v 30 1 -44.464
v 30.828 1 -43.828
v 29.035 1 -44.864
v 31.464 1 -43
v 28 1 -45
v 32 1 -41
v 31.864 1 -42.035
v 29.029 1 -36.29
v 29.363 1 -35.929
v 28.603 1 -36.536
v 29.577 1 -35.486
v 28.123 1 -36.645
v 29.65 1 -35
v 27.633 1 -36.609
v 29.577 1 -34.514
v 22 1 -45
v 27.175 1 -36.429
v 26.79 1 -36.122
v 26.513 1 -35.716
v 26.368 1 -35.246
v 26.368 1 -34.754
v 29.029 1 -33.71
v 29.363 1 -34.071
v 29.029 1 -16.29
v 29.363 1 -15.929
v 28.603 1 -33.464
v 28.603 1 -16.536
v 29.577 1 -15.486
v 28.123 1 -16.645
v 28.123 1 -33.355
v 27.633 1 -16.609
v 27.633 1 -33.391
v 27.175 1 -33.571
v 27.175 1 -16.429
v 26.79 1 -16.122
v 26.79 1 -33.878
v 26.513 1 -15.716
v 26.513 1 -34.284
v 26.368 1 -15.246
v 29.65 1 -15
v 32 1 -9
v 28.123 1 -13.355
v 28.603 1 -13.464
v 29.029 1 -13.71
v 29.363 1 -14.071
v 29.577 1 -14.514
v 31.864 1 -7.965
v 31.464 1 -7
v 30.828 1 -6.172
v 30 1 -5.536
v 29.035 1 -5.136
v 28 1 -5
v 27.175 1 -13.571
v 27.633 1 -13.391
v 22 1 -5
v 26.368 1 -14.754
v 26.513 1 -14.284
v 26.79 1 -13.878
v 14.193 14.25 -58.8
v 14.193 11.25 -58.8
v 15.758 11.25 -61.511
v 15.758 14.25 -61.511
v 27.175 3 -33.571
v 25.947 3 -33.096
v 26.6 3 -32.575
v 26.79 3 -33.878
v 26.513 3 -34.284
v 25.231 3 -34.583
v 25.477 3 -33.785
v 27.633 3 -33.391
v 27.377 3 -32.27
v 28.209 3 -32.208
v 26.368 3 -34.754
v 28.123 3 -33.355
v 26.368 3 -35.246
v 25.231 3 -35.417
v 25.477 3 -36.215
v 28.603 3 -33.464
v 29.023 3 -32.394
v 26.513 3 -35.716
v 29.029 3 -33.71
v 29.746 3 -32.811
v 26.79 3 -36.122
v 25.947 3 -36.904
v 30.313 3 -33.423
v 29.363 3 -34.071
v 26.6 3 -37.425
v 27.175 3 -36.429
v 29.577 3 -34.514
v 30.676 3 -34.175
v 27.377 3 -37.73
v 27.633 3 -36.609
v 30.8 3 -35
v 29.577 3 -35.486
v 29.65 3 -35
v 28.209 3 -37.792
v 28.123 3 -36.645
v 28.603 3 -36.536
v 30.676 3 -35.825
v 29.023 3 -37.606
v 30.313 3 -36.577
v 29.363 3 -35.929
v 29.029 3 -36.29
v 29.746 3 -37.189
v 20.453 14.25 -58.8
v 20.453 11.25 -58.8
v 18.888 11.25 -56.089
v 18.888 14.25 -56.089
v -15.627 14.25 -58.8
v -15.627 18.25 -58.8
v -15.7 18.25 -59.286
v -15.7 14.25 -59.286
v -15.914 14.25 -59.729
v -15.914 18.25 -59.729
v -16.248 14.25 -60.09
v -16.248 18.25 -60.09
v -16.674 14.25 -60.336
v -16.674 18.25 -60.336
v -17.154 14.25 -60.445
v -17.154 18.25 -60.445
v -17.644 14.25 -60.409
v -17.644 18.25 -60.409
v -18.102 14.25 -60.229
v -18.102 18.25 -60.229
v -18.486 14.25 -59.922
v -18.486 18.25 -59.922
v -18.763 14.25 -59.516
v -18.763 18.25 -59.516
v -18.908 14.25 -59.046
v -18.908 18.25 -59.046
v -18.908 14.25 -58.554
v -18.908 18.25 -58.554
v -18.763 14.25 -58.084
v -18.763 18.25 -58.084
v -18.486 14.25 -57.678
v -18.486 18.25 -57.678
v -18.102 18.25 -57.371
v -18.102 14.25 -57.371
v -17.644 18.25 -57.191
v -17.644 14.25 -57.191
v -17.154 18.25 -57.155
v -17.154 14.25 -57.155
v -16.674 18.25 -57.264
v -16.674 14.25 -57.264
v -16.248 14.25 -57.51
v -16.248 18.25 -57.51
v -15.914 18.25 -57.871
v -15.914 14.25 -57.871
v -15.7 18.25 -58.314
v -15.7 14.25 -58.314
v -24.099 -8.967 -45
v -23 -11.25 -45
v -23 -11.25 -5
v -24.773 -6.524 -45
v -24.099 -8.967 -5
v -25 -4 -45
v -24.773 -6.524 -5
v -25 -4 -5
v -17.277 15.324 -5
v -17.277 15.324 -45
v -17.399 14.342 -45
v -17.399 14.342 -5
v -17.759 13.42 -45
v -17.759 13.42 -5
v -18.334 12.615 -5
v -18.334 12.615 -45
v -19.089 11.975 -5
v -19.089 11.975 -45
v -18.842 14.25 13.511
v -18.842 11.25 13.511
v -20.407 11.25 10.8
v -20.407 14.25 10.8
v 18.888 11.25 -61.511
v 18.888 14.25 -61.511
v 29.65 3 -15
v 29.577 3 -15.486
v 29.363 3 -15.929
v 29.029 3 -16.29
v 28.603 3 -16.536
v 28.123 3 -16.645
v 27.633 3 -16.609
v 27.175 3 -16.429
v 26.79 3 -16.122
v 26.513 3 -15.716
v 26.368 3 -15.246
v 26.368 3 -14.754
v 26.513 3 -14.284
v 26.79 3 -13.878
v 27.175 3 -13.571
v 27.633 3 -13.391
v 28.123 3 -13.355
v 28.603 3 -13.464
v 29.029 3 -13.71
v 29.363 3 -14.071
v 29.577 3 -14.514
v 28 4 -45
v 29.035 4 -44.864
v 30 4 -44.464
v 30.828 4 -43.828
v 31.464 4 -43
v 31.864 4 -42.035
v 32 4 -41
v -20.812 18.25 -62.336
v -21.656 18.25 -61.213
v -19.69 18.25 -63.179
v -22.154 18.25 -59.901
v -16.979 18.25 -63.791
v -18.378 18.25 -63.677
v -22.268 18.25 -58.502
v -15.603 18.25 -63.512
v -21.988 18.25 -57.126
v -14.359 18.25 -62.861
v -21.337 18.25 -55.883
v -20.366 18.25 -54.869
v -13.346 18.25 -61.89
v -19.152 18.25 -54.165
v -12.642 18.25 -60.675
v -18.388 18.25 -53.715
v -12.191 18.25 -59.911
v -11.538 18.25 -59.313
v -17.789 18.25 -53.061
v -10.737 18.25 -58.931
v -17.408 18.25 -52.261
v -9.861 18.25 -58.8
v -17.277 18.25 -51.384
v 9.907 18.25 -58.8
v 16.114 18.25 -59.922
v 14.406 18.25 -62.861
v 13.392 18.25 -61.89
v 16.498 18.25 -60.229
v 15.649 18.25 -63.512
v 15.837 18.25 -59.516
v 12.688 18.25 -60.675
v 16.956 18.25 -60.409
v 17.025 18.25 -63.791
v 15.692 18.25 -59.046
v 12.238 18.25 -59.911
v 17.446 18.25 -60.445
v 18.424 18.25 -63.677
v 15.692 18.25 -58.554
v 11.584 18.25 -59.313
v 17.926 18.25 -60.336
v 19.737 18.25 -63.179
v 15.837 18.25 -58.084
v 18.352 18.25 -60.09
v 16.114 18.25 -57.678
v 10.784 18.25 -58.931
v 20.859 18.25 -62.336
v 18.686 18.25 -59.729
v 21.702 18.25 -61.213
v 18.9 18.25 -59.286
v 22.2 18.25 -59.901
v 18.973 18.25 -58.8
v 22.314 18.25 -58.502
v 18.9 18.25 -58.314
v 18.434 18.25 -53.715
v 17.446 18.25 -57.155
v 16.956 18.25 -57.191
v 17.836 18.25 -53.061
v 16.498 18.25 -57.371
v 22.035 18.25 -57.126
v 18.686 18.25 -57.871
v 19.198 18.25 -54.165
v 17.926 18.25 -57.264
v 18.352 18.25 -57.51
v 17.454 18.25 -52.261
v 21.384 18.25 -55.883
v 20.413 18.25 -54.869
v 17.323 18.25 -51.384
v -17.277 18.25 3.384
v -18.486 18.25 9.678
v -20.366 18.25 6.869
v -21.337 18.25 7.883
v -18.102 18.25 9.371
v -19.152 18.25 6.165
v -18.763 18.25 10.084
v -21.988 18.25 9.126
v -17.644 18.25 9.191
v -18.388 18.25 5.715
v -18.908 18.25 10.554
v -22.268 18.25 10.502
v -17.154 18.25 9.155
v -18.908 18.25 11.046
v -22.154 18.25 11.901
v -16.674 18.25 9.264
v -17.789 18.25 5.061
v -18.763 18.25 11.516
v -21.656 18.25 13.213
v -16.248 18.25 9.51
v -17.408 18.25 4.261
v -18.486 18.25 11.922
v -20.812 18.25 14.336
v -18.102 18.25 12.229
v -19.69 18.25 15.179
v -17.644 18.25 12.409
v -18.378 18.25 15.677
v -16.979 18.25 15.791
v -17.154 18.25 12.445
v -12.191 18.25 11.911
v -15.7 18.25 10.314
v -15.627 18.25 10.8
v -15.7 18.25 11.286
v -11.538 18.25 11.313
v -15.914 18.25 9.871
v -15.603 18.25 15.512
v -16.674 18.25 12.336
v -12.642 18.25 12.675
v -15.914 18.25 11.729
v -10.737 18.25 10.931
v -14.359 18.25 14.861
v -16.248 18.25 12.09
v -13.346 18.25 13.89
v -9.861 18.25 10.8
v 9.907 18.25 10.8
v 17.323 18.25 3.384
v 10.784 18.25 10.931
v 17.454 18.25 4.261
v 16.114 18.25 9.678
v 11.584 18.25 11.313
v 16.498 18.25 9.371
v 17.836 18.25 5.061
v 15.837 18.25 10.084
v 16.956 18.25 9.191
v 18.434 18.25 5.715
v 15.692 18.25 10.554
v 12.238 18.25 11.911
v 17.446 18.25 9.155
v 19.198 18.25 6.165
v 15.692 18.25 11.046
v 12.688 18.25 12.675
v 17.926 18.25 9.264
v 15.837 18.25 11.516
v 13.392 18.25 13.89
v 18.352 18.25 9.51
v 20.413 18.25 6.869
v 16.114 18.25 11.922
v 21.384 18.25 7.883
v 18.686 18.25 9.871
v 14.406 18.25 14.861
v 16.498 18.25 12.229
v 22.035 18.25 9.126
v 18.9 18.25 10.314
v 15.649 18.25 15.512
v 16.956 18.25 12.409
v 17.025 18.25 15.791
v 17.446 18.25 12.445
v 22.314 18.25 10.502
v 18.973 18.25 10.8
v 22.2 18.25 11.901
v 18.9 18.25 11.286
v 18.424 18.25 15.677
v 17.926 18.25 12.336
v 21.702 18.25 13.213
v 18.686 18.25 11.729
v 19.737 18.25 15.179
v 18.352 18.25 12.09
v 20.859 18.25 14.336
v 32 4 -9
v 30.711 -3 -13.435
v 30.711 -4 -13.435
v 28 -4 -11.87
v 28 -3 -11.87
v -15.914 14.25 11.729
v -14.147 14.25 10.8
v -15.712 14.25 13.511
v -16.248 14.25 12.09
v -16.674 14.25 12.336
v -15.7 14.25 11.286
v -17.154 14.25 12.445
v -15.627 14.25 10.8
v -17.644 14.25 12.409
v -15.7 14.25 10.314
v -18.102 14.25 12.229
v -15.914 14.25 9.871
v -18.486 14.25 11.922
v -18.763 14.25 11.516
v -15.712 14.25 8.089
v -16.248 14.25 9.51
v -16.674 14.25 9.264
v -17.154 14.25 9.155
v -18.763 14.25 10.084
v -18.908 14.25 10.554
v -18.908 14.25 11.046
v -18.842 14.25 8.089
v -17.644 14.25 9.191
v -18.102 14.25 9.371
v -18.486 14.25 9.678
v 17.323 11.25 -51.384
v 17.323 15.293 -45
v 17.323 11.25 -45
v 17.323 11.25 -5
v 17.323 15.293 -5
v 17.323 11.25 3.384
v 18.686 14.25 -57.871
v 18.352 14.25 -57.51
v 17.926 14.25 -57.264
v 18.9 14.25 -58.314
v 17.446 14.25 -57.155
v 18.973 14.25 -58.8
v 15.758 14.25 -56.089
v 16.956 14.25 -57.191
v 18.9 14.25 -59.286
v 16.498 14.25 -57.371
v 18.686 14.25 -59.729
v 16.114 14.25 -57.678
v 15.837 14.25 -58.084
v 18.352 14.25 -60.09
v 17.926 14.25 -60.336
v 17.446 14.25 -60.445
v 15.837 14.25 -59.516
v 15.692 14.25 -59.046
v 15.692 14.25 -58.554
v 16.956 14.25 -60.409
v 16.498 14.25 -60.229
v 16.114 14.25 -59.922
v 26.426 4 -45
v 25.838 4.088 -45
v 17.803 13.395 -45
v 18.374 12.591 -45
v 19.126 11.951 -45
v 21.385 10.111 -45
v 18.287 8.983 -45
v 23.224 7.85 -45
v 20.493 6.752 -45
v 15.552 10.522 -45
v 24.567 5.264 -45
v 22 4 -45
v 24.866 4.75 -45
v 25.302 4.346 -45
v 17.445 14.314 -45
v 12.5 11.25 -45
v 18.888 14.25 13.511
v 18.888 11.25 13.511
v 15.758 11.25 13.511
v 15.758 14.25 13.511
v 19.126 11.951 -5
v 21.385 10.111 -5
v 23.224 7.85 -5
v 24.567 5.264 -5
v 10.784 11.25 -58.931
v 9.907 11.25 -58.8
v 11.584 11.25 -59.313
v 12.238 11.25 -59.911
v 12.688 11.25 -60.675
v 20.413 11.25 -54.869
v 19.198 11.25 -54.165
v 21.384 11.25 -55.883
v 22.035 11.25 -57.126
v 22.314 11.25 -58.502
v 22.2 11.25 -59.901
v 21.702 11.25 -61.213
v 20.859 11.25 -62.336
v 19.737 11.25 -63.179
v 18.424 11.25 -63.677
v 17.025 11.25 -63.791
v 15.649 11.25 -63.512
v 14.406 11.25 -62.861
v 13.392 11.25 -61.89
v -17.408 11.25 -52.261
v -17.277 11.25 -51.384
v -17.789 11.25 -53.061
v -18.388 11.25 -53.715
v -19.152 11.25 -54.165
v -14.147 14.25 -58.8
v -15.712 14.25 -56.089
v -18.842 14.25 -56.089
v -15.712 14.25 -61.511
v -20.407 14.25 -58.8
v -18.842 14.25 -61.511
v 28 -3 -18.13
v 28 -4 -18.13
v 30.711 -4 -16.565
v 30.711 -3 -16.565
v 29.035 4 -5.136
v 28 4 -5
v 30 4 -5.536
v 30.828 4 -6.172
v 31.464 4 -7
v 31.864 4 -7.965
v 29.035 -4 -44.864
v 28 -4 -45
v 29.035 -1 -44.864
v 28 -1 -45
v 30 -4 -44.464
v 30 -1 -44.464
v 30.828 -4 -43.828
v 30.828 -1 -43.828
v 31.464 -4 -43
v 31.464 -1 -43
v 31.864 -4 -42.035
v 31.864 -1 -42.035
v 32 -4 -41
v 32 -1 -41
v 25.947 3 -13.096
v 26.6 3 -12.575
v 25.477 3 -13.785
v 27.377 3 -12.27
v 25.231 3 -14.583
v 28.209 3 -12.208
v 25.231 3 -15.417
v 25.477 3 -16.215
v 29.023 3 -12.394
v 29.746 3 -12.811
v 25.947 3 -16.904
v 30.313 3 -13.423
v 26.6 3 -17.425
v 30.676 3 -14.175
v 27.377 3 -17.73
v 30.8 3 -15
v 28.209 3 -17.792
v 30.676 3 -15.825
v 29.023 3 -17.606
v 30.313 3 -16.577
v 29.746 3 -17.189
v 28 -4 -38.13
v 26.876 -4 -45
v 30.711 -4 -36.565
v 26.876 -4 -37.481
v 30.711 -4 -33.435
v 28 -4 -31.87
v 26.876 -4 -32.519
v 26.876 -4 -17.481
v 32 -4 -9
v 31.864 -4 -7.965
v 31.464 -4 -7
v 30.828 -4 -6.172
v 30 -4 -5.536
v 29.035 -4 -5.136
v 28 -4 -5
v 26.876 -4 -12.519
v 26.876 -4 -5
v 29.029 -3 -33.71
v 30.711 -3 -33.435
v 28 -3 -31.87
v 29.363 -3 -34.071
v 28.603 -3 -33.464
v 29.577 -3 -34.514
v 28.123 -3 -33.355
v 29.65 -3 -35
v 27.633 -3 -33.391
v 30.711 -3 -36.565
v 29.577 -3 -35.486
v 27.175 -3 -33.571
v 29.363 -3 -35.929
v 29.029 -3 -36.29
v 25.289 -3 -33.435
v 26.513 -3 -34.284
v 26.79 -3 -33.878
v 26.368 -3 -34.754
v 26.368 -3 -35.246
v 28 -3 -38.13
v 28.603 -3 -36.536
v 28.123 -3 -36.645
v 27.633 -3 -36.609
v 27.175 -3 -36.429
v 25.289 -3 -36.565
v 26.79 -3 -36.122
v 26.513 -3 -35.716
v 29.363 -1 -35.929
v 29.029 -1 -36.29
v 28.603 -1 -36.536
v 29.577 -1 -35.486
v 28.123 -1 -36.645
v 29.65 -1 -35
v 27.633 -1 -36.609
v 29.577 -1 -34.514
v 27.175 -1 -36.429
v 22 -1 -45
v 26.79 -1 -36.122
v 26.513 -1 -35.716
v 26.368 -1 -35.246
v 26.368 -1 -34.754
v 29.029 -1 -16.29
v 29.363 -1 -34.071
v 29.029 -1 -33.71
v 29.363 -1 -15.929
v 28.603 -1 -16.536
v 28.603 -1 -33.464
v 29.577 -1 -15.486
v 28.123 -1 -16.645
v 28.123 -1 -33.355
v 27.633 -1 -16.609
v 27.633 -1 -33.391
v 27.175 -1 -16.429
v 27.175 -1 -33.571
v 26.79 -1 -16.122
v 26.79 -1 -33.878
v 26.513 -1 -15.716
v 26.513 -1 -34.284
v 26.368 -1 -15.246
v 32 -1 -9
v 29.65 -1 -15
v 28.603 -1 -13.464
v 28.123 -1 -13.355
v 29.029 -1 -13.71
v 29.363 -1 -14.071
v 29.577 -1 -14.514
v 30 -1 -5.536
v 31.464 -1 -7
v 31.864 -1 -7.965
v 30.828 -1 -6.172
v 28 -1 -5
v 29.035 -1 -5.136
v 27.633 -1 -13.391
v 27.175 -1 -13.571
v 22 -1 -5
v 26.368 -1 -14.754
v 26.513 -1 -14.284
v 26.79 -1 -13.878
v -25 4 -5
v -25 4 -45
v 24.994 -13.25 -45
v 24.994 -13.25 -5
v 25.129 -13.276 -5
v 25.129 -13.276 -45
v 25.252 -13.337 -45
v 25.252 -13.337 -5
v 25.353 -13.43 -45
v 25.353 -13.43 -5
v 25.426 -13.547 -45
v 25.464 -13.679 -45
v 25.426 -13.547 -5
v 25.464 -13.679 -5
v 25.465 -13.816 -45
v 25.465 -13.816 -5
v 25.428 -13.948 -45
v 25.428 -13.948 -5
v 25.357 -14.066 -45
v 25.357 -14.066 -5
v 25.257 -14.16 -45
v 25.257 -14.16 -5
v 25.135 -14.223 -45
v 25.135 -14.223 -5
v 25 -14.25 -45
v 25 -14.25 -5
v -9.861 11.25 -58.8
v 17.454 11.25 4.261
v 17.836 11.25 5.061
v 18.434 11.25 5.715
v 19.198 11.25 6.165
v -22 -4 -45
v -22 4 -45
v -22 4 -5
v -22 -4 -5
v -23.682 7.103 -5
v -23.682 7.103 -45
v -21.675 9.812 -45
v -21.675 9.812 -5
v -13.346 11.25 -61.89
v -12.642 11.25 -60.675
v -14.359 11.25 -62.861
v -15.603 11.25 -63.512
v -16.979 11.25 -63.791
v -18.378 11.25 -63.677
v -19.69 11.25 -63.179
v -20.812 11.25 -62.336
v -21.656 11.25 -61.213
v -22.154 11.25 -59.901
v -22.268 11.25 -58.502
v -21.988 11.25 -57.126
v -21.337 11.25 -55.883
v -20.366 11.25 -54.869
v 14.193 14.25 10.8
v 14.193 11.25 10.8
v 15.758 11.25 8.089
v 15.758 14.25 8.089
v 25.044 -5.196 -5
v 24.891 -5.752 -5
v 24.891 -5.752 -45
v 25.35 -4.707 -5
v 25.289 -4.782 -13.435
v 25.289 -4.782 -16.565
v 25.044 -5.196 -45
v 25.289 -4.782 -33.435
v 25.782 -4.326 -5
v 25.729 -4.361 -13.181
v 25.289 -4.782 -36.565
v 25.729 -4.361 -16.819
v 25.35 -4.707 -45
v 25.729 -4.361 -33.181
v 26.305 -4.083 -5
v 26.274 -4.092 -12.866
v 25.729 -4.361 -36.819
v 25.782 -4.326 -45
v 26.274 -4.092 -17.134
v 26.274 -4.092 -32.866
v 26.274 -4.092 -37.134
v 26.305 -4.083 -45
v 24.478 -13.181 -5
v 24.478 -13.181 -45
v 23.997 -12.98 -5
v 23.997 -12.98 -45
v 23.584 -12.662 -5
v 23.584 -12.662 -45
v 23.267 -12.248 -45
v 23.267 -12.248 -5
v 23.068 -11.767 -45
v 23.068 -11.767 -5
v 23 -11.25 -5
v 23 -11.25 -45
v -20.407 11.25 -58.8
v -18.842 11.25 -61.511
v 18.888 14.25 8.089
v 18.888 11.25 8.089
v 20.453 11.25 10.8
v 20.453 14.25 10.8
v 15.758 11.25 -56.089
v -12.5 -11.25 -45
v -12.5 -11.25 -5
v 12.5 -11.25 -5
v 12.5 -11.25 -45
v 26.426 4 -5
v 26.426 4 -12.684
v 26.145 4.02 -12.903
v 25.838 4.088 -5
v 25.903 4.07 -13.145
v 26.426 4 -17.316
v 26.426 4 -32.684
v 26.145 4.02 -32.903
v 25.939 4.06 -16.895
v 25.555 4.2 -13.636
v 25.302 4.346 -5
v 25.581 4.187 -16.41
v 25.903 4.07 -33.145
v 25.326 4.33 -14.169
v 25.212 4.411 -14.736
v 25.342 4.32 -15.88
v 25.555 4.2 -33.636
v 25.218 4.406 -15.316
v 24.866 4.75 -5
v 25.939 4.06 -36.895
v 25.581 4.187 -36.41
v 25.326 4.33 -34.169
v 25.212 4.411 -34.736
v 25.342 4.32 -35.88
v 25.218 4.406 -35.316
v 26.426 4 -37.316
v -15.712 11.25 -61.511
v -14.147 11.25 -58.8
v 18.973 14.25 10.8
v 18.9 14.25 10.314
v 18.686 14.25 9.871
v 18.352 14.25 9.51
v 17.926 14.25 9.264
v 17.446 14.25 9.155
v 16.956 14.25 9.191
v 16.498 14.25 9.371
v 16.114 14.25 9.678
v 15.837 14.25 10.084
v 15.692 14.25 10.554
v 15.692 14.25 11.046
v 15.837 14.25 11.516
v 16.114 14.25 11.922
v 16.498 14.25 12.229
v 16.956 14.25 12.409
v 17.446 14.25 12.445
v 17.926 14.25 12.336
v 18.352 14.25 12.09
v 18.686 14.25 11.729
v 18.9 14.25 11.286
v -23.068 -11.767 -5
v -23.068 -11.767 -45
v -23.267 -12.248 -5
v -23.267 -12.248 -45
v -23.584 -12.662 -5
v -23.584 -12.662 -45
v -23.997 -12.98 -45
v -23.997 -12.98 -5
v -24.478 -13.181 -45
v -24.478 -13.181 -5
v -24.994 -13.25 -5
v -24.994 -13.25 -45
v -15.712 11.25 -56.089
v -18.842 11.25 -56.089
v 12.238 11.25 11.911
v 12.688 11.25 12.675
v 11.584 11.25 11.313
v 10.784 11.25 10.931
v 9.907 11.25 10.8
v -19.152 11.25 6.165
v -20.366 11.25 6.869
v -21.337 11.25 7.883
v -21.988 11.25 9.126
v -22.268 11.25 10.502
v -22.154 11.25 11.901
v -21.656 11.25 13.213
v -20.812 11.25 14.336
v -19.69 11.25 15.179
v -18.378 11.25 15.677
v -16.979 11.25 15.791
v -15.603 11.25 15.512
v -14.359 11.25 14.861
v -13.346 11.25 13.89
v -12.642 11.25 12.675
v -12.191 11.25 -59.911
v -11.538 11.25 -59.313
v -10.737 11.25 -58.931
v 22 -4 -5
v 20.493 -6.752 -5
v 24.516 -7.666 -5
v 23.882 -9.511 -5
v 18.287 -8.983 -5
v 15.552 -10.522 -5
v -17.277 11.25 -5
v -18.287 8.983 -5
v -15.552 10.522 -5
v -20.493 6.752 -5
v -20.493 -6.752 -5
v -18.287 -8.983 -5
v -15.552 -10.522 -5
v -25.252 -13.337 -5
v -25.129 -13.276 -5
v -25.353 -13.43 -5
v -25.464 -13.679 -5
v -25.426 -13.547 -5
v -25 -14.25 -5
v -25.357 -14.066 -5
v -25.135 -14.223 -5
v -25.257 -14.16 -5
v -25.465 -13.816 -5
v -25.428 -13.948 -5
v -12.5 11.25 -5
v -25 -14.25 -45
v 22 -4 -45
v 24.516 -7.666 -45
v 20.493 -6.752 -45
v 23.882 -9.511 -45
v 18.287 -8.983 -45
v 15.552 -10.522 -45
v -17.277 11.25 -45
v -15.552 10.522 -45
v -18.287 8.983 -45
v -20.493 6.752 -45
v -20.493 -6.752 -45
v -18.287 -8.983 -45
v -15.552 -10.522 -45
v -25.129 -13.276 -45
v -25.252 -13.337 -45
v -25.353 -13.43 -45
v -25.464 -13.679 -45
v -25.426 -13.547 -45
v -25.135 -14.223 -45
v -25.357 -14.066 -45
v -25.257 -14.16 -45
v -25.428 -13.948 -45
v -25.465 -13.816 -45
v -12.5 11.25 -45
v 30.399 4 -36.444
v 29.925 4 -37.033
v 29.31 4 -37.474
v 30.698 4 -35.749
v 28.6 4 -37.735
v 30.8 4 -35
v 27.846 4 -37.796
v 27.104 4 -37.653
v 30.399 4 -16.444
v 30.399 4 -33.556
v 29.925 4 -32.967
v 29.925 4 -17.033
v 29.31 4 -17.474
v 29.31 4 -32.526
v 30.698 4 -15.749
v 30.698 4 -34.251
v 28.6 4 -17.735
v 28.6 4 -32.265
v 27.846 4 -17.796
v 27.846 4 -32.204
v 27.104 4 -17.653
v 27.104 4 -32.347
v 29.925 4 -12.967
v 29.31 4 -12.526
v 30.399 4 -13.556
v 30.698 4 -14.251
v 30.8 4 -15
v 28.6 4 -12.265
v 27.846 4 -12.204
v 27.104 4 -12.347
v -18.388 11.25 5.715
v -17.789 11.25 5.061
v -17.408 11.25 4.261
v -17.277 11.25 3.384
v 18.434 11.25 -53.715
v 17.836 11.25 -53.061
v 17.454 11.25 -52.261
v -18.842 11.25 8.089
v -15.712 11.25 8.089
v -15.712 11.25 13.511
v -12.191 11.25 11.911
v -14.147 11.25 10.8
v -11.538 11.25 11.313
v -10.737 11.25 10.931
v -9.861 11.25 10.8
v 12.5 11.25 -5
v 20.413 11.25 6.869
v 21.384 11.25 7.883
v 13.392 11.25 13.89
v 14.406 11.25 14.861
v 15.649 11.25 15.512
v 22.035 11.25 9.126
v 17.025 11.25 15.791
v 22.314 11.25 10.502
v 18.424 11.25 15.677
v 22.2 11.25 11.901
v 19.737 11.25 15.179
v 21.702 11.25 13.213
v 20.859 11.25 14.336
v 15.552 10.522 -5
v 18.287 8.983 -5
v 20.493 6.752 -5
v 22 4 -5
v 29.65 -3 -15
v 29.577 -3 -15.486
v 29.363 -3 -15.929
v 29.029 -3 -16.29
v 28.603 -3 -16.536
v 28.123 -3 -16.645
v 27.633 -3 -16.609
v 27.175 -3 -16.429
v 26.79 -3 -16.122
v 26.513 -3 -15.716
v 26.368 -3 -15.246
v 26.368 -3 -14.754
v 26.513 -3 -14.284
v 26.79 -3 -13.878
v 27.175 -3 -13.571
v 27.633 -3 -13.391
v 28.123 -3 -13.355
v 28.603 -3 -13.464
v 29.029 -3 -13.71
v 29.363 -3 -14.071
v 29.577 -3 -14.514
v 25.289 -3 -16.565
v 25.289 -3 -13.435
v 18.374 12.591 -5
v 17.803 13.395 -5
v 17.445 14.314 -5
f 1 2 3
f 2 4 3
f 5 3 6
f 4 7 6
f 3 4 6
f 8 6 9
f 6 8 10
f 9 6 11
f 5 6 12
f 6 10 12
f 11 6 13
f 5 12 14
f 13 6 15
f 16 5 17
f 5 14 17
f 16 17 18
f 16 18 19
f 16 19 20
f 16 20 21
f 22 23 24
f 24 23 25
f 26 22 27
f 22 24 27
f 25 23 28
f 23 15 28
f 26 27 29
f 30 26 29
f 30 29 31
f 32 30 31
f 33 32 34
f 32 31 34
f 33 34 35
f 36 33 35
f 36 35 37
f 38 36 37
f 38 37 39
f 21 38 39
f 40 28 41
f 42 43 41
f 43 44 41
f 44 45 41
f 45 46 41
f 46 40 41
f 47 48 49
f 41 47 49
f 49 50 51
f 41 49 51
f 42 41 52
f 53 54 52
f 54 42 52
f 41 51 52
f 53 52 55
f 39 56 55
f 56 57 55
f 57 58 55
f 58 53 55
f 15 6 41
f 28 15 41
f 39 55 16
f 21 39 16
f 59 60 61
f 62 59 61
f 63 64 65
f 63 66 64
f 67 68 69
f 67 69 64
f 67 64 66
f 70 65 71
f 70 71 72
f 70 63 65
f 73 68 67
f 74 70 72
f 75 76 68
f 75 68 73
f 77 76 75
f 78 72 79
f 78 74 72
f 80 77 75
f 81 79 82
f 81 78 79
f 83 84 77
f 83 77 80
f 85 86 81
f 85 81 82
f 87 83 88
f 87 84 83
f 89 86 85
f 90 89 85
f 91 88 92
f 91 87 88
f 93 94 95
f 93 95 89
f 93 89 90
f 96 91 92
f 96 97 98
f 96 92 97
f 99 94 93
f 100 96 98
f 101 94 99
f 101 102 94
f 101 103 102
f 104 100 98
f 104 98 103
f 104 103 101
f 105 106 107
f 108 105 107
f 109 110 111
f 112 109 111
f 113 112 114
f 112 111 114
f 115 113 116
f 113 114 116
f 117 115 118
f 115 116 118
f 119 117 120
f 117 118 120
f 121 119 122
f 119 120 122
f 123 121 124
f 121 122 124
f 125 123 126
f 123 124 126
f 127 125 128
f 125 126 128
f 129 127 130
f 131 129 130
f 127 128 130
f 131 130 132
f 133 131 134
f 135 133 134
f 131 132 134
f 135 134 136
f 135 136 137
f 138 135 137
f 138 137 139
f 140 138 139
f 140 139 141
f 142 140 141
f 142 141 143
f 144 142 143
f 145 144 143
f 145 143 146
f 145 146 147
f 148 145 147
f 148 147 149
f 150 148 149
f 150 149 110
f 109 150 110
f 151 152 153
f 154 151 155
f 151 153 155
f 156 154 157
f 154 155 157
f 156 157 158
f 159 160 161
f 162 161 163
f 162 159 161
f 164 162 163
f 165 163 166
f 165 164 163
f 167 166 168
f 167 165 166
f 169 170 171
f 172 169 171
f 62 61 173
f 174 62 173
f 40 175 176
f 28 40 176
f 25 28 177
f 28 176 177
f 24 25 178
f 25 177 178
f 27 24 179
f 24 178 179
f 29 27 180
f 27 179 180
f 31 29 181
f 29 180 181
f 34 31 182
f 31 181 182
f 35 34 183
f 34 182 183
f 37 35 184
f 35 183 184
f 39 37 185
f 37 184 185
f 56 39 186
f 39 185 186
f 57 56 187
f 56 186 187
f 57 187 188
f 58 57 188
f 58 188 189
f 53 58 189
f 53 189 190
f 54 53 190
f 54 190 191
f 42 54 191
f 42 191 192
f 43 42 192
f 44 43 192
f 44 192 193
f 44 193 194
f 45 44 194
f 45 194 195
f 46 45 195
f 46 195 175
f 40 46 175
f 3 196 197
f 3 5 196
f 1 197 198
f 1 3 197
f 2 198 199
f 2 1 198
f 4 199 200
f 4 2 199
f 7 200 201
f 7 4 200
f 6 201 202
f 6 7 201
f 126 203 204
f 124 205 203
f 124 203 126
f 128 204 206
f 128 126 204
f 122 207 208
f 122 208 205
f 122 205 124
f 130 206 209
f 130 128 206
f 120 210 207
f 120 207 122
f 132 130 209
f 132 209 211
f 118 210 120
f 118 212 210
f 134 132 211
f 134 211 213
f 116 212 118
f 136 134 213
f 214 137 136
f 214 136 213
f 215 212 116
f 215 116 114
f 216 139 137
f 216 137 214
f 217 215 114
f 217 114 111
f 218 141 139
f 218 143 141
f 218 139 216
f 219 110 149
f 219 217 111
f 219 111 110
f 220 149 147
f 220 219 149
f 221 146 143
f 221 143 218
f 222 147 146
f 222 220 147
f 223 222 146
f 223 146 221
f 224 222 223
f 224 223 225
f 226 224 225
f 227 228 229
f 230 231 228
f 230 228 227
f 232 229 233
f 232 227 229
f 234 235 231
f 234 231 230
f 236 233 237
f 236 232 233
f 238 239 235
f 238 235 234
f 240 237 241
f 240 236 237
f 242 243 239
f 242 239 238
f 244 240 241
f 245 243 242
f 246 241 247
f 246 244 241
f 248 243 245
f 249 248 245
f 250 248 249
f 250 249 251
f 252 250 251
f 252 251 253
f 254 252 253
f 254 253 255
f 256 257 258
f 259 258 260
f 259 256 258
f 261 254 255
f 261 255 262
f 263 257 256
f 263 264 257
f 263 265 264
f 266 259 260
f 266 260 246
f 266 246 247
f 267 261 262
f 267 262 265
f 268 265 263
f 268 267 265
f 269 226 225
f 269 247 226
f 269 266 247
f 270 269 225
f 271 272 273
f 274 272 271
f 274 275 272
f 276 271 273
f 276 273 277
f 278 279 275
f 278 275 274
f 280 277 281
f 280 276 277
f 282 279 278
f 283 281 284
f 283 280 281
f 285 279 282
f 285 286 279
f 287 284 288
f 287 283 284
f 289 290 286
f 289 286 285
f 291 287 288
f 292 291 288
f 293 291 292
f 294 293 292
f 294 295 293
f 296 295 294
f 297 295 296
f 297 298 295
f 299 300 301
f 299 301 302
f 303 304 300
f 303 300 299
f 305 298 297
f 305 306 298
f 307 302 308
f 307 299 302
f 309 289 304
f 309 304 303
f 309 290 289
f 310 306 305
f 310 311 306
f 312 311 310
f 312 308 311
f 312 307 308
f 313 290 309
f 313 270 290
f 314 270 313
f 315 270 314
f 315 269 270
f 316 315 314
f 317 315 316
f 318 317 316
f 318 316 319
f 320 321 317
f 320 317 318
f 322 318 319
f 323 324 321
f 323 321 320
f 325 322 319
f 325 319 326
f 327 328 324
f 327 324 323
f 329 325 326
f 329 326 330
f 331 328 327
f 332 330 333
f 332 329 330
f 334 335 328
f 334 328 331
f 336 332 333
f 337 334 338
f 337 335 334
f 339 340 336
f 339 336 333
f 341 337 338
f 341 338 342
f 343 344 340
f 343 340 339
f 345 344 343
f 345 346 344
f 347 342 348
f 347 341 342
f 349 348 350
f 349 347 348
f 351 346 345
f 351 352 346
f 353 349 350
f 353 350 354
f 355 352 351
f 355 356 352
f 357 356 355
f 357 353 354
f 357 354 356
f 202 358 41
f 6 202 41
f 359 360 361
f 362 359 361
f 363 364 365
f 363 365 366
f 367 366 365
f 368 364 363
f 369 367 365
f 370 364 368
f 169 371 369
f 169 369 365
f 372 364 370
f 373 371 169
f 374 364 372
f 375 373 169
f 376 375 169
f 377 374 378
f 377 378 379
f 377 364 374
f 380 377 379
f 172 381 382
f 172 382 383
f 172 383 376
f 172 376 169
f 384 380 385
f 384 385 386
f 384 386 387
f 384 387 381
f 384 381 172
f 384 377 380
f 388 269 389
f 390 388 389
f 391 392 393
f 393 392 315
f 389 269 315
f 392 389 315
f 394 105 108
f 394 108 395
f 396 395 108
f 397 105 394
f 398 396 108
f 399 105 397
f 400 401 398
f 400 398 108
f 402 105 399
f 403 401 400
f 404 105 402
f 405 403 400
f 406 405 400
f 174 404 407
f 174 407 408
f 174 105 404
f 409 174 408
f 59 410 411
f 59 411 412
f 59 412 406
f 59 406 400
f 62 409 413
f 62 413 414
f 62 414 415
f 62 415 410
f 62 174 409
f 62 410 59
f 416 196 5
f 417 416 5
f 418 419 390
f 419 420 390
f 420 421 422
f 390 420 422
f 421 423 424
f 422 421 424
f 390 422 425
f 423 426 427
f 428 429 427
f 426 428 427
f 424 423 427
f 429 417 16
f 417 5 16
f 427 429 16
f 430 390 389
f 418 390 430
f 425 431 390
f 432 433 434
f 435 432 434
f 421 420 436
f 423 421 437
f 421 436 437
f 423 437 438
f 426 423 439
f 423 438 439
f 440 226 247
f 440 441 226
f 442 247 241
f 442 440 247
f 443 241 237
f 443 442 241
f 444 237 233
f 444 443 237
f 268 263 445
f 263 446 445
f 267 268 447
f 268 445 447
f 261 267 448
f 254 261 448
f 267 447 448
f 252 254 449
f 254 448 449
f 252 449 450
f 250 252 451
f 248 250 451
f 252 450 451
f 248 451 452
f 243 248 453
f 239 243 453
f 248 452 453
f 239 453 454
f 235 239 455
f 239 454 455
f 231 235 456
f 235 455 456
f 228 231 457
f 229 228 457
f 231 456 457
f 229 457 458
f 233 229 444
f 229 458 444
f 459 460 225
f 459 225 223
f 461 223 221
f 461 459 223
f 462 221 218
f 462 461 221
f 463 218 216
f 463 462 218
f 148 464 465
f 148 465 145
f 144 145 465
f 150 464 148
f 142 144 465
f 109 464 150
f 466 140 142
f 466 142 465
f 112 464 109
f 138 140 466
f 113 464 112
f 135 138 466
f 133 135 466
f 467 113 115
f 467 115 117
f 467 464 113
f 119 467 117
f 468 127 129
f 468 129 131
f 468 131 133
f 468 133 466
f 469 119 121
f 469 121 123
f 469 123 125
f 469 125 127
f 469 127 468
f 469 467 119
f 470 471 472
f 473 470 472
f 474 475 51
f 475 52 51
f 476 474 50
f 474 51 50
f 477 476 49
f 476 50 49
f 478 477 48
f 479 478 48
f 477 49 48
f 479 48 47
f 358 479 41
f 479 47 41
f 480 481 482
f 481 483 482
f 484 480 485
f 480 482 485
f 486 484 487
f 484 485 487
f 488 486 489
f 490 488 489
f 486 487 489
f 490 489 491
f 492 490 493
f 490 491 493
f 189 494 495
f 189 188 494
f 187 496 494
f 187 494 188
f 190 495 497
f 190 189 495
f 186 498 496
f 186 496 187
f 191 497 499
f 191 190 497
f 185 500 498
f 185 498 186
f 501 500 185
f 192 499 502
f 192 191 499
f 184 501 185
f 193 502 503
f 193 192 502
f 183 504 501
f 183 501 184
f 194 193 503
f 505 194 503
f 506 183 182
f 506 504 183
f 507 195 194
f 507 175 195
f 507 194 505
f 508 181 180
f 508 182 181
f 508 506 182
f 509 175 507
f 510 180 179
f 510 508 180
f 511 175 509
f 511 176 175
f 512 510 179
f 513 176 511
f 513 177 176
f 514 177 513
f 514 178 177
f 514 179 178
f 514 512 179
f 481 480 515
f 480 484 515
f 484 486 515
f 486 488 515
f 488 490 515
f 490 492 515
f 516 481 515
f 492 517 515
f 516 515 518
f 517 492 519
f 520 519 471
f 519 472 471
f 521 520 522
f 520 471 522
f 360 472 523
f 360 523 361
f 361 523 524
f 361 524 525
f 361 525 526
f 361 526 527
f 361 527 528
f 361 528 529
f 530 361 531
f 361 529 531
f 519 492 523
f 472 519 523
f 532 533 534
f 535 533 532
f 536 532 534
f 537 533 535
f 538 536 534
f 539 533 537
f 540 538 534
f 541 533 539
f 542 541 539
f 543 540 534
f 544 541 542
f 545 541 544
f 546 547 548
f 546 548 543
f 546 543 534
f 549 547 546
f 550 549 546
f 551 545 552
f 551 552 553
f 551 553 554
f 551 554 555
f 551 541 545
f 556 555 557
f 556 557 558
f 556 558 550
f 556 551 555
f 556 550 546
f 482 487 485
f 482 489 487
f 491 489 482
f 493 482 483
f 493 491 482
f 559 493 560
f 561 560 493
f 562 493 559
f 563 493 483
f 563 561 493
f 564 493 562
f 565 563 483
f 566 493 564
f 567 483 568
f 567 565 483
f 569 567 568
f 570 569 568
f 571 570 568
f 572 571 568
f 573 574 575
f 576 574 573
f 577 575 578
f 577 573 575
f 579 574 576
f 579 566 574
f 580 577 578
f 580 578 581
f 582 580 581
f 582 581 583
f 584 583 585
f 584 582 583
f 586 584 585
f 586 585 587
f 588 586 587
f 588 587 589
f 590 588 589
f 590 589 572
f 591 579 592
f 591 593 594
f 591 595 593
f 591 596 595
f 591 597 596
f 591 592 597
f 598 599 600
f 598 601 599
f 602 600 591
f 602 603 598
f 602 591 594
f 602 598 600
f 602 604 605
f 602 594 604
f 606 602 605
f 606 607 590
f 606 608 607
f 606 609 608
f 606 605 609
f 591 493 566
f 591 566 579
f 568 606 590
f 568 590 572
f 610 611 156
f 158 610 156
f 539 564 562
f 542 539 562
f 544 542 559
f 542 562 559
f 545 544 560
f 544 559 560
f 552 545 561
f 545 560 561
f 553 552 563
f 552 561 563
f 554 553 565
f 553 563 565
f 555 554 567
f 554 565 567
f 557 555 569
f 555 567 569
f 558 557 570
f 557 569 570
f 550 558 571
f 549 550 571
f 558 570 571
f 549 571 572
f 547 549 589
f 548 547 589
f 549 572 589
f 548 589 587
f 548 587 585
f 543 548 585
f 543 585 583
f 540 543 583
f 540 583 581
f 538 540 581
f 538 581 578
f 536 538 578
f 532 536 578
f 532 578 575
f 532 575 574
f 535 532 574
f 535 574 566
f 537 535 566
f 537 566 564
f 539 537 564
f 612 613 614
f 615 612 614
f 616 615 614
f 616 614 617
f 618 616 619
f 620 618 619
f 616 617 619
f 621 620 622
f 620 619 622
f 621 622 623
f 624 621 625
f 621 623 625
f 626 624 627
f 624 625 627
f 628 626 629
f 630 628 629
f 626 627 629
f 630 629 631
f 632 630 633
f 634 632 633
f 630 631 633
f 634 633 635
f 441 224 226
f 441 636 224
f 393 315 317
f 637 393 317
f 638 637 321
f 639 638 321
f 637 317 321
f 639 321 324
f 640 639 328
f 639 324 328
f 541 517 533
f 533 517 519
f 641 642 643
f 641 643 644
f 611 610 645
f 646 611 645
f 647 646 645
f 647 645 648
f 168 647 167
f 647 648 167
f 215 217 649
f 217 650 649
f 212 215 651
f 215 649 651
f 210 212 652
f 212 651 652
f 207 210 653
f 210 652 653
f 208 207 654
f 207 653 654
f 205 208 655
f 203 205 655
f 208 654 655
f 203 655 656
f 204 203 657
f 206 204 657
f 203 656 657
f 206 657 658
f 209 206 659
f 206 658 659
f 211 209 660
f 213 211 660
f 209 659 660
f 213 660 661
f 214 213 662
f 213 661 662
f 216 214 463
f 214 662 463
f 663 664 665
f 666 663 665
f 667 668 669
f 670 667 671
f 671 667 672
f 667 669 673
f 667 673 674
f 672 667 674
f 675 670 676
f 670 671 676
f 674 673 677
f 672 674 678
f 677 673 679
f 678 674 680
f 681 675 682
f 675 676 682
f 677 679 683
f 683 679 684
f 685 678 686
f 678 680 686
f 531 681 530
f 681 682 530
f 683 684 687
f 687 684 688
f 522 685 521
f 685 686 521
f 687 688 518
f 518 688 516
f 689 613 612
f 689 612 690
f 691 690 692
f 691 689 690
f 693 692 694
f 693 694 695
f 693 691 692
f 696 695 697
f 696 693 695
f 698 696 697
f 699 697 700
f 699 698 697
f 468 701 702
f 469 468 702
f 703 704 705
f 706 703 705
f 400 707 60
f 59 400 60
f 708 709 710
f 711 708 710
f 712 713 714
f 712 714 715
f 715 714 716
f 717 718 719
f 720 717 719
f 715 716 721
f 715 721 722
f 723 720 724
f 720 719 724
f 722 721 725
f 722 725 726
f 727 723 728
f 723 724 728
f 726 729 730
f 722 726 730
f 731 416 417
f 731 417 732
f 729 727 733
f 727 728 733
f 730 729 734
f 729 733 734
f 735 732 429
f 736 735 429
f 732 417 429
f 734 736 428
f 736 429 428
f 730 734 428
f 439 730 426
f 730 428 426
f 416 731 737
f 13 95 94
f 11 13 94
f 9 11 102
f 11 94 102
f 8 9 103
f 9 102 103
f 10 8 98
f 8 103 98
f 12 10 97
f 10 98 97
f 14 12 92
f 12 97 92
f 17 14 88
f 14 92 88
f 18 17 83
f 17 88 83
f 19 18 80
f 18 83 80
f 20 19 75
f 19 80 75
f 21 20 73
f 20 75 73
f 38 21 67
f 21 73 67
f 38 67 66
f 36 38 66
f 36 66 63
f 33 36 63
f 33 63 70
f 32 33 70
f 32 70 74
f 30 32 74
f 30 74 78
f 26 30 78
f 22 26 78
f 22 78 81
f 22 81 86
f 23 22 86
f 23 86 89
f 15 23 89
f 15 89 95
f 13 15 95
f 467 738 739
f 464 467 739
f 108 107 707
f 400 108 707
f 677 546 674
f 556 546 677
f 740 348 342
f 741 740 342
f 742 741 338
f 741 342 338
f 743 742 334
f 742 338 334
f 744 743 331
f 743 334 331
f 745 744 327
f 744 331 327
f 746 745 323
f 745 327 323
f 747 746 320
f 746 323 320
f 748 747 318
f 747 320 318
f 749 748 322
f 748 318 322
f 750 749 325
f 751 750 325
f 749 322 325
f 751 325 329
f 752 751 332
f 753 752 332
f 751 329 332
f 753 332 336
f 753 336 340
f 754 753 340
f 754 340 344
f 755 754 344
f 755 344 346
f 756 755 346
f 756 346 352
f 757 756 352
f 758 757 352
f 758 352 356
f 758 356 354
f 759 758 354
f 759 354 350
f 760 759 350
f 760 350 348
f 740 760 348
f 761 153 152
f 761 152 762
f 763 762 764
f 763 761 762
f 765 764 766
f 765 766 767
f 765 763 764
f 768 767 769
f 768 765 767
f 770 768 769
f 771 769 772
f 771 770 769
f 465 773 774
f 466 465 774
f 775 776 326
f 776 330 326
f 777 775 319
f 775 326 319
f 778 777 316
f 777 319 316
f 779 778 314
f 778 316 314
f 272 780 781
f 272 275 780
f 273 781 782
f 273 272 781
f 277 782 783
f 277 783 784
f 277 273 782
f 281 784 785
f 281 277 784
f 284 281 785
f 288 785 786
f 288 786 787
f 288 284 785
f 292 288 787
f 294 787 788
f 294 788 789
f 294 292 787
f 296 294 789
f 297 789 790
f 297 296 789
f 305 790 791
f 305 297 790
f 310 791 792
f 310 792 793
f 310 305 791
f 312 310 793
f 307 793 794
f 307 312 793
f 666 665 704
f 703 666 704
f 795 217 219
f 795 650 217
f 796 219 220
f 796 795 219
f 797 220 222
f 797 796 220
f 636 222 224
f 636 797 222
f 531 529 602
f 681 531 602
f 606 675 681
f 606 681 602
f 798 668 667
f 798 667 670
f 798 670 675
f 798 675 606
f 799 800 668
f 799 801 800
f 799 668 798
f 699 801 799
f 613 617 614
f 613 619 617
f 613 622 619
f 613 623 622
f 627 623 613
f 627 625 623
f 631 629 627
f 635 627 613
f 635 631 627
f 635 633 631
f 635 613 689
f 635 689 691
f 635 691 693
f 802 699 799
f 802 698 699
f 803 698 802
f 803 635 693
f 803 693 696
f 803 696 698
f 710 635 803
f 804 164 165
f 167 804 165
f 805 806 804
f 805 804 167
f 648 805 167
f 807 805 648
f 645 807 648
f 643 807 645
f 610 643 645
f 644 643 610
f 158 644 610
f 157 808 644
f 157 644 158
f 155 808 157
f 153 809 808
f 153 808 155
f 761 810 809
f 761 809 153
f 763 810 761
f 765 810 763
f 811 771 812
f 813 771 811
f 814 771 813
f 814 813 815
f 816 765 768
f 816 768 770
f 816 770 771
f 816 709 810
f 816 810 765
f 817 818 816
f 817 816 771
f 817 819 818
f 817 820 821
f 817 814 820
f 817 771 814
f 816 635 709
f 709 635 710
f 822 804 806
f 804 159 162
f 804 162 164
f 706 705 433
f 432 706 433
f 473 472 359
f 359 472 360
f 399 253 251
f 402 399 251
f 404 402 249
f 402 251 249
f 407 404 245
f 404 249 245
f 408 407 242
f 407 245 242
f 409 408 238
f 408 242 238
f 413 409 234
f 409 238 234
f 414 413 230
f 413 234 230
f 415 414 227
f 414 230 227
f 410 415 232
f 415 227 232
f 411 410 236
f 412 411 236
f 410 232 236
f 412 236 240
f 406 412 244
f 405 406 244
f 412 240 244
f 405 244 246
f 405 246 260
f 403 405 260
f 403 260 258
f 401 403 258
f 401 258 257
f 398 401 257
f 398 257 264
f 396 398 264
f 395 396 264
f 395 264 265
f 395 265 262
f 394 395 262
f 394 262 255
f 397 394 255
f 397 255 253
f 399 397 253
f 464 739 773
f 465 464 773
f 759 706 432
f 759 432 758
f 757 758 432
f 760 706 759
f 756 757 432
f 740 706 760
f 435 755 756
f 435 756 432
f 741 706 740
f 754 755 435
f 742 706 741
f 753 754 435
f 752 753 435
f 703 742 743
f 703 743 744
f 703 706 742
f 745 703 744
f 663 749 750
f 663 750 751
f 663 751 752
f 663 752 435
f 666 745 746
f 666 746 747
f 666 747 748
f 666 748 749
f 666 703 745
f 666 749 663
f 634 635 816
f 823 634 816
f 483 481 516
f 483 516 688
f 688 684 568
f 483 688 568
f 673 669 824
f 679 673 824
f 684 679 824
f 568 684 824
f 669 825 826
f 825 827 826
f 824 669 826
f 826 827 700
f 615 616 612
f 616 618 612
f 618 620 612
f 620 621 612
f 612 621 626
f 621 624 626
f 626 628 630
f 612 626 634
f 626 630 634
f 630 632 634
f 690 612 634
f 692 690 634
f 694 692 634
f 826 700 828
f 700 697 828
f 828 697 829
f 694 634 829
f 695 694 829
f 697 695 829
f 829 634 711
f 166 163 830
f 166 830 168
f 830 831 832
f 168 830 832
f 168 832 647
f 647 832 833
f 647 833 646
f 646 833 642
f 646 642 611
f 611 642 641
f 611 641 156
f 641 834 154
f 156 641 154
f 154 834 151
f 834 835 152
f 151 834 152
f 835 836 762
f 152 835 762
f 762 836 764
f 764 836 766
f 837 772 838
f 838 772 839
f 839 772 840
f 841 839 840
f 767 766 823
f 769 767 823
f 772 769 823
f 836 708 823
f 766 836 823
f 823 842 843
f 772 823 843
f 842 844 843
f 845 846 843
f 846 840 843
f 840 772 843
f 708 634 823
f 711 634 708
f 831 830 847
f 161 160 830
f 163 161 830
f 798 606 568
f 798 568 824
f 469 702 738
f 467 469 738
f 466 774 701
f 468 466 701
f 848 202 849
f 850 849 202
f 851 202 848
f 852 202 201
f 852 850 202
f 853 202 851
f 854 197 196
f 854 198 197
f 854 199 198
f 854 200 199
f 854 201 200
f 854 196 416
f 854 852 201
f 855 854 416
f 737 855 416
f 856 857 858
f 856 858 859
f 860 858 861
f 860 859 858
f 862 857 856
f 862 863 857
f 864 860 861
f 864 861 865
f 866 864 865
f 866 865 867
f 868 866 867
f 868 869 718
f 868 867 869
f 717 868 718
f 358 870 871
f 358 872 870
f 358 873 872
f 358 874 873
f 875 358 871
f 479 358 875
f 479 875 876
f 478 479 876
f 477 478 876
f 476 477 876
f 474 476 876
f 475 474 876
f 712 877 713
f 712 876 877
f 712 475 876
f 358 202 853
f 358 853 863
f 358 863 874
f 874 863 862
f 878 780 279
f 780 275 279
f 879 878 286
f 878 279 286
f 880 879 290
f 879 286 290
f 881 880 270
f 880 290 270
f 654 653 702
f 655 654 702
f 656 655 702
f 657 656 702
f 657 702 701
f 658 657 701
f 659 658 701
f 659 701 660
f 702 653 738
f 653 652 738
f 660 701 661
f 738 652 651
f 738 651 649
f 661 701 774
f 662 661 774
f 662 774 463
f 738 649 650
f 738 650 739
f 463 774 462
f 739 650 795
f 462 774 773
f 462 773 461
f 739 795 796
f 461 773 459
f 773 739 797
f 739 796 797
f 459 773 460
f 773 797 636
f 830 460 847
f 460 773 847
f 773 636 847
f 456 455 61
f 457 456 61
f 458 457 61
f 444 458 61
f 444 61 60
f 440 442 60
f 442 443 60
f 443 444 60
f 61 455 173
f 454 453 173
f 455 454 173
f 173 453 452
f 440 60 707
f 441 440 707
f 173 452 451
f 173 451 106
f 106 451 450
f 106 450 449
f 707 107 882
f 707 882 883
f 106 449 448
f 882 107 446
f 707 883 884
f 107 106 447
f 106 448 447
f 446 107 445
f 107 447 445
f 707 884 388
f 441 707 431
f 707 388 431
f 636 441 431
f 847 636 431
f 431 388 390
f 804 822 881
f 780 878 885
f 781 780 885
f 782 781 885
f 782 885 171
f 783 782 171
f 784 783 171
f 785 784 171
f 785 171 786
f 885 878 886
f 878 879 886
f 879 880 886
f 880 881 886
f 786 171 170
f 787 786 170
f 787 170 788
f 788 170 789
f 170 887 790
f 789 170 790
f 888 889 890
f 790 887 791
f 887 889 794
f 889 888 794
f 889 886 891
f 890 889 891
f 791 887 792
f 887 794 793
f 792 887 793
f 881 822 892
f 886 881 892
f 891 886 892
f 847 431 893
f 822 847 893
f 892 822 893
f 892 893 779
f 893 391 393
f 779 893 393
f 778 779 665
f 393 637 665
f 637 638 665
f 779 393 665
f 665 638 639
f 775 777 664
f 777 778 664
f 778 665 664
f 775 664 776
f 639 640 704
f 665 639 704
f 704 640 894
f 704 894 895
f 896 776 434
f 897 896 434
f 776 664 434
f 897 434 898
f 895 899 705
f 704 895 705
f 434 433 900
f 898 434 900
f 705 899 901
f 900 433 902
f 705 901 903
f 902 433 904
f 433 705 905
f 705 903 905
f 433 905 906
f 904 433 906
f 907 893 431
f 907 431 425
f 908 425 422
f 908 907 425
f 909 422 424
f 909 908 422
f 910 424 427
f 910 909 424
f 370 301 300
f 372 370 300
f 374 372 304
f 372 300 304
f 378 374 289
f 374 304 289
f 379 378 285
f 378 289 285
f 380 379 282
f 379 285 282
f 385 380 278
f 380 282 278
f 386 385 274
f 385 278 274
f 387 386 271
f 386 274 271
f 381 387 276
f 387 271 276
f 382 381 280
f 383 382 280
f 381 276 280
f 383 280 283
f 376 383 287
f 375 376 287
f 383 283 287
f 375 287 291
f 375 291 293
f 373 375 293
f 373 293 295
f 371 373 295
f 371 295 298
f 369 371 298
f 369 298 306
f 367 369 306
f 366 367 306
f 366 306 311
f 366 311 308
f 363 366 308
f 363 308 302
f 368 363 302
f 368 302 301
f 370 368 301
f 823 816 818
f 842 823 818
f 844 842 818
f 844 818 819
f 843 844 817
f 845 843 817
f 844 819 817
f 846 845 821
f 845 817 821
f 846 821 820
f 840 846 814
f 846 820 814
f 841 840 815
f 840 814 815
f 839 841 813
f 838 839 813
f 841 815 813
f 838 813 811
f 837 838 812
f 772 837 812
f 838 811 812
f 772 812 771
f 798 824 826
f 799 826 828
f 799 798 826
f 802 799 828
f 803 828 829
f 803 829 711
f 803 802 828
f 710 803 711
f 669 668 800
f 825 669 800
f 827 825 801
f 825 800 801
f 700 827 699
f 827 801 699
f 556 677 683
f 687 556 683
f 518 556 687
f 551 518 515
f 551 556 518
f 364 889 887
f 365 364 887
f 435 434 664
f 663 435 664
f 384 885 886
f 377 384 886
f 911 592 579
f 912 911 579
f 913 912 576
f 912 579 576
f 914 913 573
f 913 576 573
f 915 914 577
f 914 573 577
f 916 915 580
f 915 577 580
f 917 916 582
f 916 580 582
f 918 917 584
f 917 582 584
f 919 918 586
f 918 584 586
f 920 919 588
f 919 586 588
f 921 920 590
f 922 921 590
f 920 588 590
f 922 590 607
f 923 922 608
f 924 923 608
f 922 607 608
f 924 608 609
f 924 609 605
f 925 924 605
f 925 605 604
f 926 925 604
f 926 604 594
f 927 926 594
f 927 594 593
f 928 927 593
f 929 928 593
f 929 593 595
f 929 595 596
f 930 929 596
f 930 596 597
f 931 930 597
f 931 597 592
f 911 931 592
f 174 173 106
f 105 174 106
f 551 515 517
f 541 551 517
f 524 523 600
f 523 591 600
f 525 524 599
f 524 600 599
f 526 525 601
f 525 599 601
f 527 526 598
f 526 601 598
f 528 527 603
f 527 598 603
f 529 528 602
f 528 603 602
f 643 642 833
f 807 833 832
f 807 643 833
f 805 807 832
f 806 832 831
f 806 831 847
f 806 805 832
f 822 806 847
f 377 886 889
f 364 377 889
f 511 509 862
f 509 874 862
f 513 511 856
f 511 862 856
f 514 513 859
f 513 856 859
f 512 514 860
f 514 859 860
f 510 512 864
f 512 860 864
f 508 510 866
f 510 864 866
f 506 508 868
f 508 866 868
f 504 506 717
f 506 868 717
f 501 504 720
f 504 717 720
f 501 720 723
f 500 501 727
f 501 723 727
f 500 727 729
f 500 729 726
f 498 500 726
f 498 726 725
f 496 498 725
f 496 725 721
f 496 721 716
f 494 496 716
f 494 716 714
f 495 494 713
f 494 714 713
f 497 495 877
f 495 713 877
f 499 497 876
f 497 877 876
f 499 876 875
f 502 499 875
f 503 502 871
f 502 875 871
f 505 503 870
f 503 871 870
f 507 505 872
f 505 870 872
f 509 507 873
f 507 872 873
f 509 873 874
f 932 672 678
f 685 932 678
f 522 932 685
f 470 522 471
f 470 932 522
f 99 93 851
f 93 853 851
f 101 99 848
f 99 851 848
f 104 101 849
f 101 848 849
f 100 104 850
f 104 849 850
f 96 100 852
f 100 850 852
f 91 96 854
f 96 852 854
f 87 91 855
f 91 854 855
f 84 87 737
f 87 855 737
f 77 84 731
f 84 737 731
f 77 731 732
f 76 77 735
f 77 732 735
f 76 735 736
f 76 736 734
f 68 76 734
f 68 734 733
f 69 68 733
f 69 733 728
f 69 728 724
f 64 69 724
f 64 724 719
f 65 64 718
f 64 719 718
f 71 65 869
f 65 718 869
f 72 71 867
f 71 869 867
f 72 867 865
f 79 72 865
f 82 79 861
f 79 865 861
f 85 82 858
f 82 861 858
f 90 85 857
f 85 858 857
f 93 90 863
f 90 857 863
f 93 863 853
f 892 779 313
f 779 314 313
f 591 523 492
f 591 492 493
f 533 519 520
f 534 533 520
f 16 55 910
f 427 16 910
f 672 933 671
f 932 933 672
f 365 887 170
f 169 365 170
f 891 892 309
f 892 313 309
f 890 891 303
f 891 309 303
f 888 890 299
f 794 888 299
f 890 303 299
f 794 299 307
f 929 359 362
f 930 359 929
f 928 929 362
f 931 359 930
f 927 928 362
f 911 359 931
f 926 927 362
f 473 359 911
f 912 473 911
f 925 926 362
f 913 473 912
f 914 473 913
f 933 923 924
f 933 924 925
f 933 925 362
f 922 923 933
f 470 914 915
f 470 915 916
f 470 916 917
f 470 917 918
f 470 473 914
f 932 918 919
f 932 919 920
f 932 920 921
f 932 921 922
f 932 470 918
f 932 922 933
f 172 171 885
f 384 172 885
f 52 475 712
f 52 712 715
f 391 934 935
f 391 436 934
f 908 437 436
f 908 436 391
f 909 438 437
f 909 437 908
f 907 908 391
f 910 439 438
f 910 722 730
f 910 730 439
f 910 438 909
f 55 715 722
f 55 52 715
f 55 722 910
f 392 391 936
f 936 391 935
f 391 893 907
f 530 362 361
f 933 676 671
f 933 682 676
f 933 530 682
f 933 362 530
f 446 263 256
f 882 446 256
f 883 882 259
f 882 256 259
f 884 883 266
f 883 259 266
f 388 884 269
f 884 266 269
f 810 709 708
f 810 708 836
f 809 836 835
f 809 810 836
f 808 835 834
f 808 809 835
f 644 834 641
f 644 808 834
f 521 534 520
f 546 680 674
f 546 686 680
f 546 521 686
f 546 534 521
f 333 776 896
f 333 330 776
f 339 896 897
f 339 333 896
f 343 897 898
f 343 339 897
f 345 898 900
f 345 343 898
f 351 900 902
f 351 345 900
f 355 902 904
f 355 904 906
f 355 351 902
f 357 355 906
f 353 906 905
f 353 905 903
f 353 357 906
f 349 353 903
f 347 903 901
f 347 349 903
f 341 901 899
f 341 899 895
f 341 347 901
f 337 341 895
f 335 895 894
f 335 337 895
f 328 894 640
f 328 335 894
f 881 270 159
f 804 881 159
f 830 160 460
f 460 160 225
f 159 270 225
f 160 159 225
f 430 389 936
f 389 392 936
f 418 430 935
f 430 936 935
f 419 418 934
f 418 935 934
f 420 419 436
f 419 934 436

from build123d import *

# Parameters (mm, degrees)
PAD_DEPTH            = 40
PAD001_DEPTH         = 4
PAD001_DEPTH_BACK    = 3
FILLET_R             = 2
FILLET001_R          = 4
FILLET002_R          = 4
SKETCH_R             = 1.65
HOLE_DEPTH           = 32.501
SKETCH003_R          = 1.65
HOLE001_DEPTH        = 18.251
POCKET_DEPTH         = 1
POCKET_DEPTH_BACK    = 2
SKETCH005_R          = 2.8
POCKET001_DEPTH      = 1
POCKET001_DEPTH_BACK = 2
POCKET002_DEPTH      = 3


with BuildPart() as part:
    # Sketch001 → Pad (new body)
    with BuildSketch(Plane(origin=(0, 0, -5), x_dir=(1, 0, 0), z_dir=(0, 0, -1))):
        with BuildLine():
            ThreePointArc((12.5, -11.25), (18.286744, -8.983492), (22, -4))
            Line((22, -1), (22, -4))
            Line((32, -1), (22, -1))
            Line((32, -4), (32, -1))
            Line((32, -4), (25, -4))
            ThreePointArc((12.5, -14.25), (20.336868, -11.060205), (25, -4))
            Line((-12.5, -14.25), (12.5, -14.25))
            ThreePointArc((-25, -4), (-20.336868, -11.060205), (-12.5, -14.25))
            Line((-25, -4), (-25, 4))
            ThreePointArc((-23, 11.25), (-24.490833, 7.760402), (-25, 4))
            ThreePointArc((-23, 11.25), (-23.58374, 12.662164), (-24.994208, 13.249992))
            ThreePointArc((-25, 14.25), (-25.468866, 13.747264), (-24.994208, 13.249992))
            Line((-12.5, 14.25), (-25, 14.25))
            Line((12.5, 14.25), (-12.5, 14.25))
            Line((12.5, 14.25), (25, 14.25))
            ThreePointArc((24.994208, 13.249992), (25.468866, 13.747264), (25, 14.25))
            ThreePointArc((24.994208, 13.249992), (23.58374, 12.662164), (23, 11.25))
            ThreePointArc((25, 4), (24.490833, 7.760402), (23, 11.25))
            Line((32, 4), (25, 4))
            Line((32, 4), (32, 1))
            Line((32, 1), (22, 1))
            Line((22, 1), (22, 4))
            ThreePointArc((22, 4), (18.286744, 8.983492), (12.5, 11.25))
            Line((-12.5, 11.25), (12.5, 11.25))
            ThreePointArc((-12.5, 11.25), (-18.286744, 8.983492), (-22, 4))
            Line((-22, -4), (-22, 4))
            ThreePointArc((-22, -4), (-18.286744, -8.983492), (-12.5, -11.25))
            Line((-12.5, -11.25), (12.5, -11.25))
        make_face()
    extrude(amount=PAD_DEPTH)

    # Sketch002 (on Face3 of Pad) → Pad001 (join, two sides)
    with BuildSketch(Plane(origin=(0.023182, 14.25, -24), x_dir=(0, 0, 1), z_dir=(0, 1, 0))) as pad001_sk:
        with BuildLine():
            ThreePointArc((36.675, 12.664876), (38.335534, 20.835534), (30.164876, 19.175))
            ThreePointArc((27.383802, 17.3), (29.060852, 17.812531), (30.164876, 19.175))
            Line((-27.383801, 17.3), (27.383802, 17.3))
            ThreePointArc((-30.164876, 19.175), (-29.060852, 17.812531), (-27.383801, 17.3))
            ThreePointArc((-30.164876, 19.175), (-38.335534, 20.835534), (-36.675, 12.664876))
            ThreePointArc((-34.8, 9.883801), (-35.312531, 11.560852), (-36.675, 12.664876))
            Line((-34.8, -9.883801), (-34.8, 9.883801))
            ThreePointArc((-36.675, -12.664876), (-35.312531, -11.560852), (-34.8, -9.883801))
            ThreePointArc((-36.675, -12.664876), (-38.335534, -20.835534), (-30.164876, -19.175))
            ThreePointArc((-27.383801, -17.3), (-29.060852, -17.812531), (-30.164876, -19.175))
            Line((27.383801, -17.3), (-27.383801, -17.3))
            ThreePointArc((30.164876, -19.175), (29.060852, -17.812531), (27.383801, -17.3))
            ThreePointArc((30.164876, -19.175), (38.335534, -20.835534), (36.675, -12.664876))
            ThreePointArc((34.8, -9.883802), (35.312531, -11.560852), (36.675, -12.664876))
            Line((34.8, 9.883801), (34.8, -9.883802))
            ThreePointArc((36.675, 12.664876), (35.312531, 11.560852), (34.8, 9.883801))
        make_face()
    extrude(amount=PAD001_DEPTH)
    extrude(pad001_sk.sketch, amount=-PAD001_DEPTH_BACK)

    # Fillet
    fillet_edges = [part.edges().sort_by_distance(p)[0] for p in [
        (25, 4, -25),
        (25, -4, -25),
    ]]
    fillet(fillet_edges, radius=FILLET_R)

    # Fillet001
    fillet001_edges = [part.edges().sort_by_distance(p)[0] for p in [
        (32, -2.5, -45),
        (32, 2.5, -45),
        (32, 2.5, -5),
        (32, -2.5, -5),
    ]]
    fillet(fillet001_edges, radius=FILLET001_R)

    # Fillet002
    fillet002_edges = [part.edges().sort_by_distance(p)[0] for p in [
        (17.323182, 12.95802, -25),
        (-17.276818, 12.979586, -25),
    ]]
    fillet(fillet002_edges, radius=FILLET002_R)

    # Sketch (on Face29 of Pad001) → Hole (cut, through all)
    with BuildSketch(Plane(origin=(0, 18.25, -5), x_dir=(1, 0, 0), z_dir=(0, 1, 0))):
        with Locations((17.323182, -15.8)):
            Circle(SKETCH_R)
        with Locations((-17.276818, -15.8)):
            Circle(SKETCH_R)
        with Locations((17.323182, 53.8)):
            Circle(SKETCH_R)
        with Locations((-17.276818, 53.8)):
            Circle(SKETCH_R)
    extrude(amount=-HOLE_DEPTH, mode=Mode.SUBTRACT)

    # Sketch003 (on Face56 of Hole) → Hole001 (cut, through all)
    with BuildSketch(Plane(origin=(0, 4, -5), x_dir=(1, 0, 0), z_dir=(0, 1, 0))):
        with Locations((28, 30)):
            Circle(SKETCH003_R)
        with Locations((28, 10)):
            Circle(SKETCH003_R)
    extrude(amount=-HOLE001_DEPTH, mode=Mode.SUBTRACT)

    # Sketch004 (on Face25 of Hole001) → Pocket (cut, two sides)
    with BuildSketch(Plane(origin=(0, -4, -5), x_dir=(-1, 0, 0), z_dir=(0, -1, 0))) as pocket_sk:
        Polygon((-30.71066, 31.565), (-30.71066, 28.435), (-28, 26.87), (-25.28934, 28.435), (-25.28934, 31.565), (-28, 33.13), align=None)
        Polygon((-28, 13.13), (-30.71066, 11.565), (-30.71066, 8.435), (-28, 6.87), (-25.28934, 8.435), (-25.28934, 11.565), align=None)
    extrude(amount=-POCKET_DEPTH, mode=Mode.SUBTRACT)
    extrude(pocket_sk.sketch, amount=POCKET_DEPTH_BACK, mode=Mode.SUBTRACT)

    # Sketch005 (on Face66 of Pocket) → Pocket001 (cut, two sides)
    with BuildSketch(Plane(origin=(0, 4, -5), x_dir=(1, 0, 0), z_dir=(0, 1, 0))) as pocket001_sk:
        with Locations((28, 30)):
            Circle(SKETCH005_R)
        with Locations((28, 10)):
            Circle(SKETCH005_R)
    extrude(amount=-POCKET001_DEPTH, mode=Mode.SUBTRACT)
    extrude(pocket001_sk.sketch, amount=POCKET001_DEPTH_BACK, mode=Mode.SUBTRACT)

    # Sketch006 (on Face8 of Pocket001) → Pocket002 (cut)
    with BuildSketch(Plane(origin=(0, 11.25, -5), x_dir=(-1, 0, 0), z_dir=(0, -1, 0))):
        Polygon((20.406818, -15.8), (18.841818, -13.08934), (15.711818, -13.08934), (14.146818, -15.8), (15.711818, -18.51066), (18.841818, -18.51066), align=None)
        Polygon((-14.193182, -15.8), (-15.758182, -13.08934), (-18.888182, -13.08934), (-20.453182, -15.8), (-18.888182, -18.51066), (-15.758182, -18.51066), align=None)
        Polygon((20.406818, 53.8), (18.841818, 56.51066), (15.711818, 56.51066), (14.146818, 53.8), (15.711818, 51.08934), (18.841818, 51.08934), align=None)
        Polygon((-14.193182, 53.8), (-15.758182, 56.51066), (-18.888182, 56.51066), (-20.453182, 53.8), (-18.888182, 51.08934), (-15.758182, 51.08934), align=None)
    extrude(amount=-POCKET002_DEPTH, mode=Mode.SUBTRACT)


solid = part.part
